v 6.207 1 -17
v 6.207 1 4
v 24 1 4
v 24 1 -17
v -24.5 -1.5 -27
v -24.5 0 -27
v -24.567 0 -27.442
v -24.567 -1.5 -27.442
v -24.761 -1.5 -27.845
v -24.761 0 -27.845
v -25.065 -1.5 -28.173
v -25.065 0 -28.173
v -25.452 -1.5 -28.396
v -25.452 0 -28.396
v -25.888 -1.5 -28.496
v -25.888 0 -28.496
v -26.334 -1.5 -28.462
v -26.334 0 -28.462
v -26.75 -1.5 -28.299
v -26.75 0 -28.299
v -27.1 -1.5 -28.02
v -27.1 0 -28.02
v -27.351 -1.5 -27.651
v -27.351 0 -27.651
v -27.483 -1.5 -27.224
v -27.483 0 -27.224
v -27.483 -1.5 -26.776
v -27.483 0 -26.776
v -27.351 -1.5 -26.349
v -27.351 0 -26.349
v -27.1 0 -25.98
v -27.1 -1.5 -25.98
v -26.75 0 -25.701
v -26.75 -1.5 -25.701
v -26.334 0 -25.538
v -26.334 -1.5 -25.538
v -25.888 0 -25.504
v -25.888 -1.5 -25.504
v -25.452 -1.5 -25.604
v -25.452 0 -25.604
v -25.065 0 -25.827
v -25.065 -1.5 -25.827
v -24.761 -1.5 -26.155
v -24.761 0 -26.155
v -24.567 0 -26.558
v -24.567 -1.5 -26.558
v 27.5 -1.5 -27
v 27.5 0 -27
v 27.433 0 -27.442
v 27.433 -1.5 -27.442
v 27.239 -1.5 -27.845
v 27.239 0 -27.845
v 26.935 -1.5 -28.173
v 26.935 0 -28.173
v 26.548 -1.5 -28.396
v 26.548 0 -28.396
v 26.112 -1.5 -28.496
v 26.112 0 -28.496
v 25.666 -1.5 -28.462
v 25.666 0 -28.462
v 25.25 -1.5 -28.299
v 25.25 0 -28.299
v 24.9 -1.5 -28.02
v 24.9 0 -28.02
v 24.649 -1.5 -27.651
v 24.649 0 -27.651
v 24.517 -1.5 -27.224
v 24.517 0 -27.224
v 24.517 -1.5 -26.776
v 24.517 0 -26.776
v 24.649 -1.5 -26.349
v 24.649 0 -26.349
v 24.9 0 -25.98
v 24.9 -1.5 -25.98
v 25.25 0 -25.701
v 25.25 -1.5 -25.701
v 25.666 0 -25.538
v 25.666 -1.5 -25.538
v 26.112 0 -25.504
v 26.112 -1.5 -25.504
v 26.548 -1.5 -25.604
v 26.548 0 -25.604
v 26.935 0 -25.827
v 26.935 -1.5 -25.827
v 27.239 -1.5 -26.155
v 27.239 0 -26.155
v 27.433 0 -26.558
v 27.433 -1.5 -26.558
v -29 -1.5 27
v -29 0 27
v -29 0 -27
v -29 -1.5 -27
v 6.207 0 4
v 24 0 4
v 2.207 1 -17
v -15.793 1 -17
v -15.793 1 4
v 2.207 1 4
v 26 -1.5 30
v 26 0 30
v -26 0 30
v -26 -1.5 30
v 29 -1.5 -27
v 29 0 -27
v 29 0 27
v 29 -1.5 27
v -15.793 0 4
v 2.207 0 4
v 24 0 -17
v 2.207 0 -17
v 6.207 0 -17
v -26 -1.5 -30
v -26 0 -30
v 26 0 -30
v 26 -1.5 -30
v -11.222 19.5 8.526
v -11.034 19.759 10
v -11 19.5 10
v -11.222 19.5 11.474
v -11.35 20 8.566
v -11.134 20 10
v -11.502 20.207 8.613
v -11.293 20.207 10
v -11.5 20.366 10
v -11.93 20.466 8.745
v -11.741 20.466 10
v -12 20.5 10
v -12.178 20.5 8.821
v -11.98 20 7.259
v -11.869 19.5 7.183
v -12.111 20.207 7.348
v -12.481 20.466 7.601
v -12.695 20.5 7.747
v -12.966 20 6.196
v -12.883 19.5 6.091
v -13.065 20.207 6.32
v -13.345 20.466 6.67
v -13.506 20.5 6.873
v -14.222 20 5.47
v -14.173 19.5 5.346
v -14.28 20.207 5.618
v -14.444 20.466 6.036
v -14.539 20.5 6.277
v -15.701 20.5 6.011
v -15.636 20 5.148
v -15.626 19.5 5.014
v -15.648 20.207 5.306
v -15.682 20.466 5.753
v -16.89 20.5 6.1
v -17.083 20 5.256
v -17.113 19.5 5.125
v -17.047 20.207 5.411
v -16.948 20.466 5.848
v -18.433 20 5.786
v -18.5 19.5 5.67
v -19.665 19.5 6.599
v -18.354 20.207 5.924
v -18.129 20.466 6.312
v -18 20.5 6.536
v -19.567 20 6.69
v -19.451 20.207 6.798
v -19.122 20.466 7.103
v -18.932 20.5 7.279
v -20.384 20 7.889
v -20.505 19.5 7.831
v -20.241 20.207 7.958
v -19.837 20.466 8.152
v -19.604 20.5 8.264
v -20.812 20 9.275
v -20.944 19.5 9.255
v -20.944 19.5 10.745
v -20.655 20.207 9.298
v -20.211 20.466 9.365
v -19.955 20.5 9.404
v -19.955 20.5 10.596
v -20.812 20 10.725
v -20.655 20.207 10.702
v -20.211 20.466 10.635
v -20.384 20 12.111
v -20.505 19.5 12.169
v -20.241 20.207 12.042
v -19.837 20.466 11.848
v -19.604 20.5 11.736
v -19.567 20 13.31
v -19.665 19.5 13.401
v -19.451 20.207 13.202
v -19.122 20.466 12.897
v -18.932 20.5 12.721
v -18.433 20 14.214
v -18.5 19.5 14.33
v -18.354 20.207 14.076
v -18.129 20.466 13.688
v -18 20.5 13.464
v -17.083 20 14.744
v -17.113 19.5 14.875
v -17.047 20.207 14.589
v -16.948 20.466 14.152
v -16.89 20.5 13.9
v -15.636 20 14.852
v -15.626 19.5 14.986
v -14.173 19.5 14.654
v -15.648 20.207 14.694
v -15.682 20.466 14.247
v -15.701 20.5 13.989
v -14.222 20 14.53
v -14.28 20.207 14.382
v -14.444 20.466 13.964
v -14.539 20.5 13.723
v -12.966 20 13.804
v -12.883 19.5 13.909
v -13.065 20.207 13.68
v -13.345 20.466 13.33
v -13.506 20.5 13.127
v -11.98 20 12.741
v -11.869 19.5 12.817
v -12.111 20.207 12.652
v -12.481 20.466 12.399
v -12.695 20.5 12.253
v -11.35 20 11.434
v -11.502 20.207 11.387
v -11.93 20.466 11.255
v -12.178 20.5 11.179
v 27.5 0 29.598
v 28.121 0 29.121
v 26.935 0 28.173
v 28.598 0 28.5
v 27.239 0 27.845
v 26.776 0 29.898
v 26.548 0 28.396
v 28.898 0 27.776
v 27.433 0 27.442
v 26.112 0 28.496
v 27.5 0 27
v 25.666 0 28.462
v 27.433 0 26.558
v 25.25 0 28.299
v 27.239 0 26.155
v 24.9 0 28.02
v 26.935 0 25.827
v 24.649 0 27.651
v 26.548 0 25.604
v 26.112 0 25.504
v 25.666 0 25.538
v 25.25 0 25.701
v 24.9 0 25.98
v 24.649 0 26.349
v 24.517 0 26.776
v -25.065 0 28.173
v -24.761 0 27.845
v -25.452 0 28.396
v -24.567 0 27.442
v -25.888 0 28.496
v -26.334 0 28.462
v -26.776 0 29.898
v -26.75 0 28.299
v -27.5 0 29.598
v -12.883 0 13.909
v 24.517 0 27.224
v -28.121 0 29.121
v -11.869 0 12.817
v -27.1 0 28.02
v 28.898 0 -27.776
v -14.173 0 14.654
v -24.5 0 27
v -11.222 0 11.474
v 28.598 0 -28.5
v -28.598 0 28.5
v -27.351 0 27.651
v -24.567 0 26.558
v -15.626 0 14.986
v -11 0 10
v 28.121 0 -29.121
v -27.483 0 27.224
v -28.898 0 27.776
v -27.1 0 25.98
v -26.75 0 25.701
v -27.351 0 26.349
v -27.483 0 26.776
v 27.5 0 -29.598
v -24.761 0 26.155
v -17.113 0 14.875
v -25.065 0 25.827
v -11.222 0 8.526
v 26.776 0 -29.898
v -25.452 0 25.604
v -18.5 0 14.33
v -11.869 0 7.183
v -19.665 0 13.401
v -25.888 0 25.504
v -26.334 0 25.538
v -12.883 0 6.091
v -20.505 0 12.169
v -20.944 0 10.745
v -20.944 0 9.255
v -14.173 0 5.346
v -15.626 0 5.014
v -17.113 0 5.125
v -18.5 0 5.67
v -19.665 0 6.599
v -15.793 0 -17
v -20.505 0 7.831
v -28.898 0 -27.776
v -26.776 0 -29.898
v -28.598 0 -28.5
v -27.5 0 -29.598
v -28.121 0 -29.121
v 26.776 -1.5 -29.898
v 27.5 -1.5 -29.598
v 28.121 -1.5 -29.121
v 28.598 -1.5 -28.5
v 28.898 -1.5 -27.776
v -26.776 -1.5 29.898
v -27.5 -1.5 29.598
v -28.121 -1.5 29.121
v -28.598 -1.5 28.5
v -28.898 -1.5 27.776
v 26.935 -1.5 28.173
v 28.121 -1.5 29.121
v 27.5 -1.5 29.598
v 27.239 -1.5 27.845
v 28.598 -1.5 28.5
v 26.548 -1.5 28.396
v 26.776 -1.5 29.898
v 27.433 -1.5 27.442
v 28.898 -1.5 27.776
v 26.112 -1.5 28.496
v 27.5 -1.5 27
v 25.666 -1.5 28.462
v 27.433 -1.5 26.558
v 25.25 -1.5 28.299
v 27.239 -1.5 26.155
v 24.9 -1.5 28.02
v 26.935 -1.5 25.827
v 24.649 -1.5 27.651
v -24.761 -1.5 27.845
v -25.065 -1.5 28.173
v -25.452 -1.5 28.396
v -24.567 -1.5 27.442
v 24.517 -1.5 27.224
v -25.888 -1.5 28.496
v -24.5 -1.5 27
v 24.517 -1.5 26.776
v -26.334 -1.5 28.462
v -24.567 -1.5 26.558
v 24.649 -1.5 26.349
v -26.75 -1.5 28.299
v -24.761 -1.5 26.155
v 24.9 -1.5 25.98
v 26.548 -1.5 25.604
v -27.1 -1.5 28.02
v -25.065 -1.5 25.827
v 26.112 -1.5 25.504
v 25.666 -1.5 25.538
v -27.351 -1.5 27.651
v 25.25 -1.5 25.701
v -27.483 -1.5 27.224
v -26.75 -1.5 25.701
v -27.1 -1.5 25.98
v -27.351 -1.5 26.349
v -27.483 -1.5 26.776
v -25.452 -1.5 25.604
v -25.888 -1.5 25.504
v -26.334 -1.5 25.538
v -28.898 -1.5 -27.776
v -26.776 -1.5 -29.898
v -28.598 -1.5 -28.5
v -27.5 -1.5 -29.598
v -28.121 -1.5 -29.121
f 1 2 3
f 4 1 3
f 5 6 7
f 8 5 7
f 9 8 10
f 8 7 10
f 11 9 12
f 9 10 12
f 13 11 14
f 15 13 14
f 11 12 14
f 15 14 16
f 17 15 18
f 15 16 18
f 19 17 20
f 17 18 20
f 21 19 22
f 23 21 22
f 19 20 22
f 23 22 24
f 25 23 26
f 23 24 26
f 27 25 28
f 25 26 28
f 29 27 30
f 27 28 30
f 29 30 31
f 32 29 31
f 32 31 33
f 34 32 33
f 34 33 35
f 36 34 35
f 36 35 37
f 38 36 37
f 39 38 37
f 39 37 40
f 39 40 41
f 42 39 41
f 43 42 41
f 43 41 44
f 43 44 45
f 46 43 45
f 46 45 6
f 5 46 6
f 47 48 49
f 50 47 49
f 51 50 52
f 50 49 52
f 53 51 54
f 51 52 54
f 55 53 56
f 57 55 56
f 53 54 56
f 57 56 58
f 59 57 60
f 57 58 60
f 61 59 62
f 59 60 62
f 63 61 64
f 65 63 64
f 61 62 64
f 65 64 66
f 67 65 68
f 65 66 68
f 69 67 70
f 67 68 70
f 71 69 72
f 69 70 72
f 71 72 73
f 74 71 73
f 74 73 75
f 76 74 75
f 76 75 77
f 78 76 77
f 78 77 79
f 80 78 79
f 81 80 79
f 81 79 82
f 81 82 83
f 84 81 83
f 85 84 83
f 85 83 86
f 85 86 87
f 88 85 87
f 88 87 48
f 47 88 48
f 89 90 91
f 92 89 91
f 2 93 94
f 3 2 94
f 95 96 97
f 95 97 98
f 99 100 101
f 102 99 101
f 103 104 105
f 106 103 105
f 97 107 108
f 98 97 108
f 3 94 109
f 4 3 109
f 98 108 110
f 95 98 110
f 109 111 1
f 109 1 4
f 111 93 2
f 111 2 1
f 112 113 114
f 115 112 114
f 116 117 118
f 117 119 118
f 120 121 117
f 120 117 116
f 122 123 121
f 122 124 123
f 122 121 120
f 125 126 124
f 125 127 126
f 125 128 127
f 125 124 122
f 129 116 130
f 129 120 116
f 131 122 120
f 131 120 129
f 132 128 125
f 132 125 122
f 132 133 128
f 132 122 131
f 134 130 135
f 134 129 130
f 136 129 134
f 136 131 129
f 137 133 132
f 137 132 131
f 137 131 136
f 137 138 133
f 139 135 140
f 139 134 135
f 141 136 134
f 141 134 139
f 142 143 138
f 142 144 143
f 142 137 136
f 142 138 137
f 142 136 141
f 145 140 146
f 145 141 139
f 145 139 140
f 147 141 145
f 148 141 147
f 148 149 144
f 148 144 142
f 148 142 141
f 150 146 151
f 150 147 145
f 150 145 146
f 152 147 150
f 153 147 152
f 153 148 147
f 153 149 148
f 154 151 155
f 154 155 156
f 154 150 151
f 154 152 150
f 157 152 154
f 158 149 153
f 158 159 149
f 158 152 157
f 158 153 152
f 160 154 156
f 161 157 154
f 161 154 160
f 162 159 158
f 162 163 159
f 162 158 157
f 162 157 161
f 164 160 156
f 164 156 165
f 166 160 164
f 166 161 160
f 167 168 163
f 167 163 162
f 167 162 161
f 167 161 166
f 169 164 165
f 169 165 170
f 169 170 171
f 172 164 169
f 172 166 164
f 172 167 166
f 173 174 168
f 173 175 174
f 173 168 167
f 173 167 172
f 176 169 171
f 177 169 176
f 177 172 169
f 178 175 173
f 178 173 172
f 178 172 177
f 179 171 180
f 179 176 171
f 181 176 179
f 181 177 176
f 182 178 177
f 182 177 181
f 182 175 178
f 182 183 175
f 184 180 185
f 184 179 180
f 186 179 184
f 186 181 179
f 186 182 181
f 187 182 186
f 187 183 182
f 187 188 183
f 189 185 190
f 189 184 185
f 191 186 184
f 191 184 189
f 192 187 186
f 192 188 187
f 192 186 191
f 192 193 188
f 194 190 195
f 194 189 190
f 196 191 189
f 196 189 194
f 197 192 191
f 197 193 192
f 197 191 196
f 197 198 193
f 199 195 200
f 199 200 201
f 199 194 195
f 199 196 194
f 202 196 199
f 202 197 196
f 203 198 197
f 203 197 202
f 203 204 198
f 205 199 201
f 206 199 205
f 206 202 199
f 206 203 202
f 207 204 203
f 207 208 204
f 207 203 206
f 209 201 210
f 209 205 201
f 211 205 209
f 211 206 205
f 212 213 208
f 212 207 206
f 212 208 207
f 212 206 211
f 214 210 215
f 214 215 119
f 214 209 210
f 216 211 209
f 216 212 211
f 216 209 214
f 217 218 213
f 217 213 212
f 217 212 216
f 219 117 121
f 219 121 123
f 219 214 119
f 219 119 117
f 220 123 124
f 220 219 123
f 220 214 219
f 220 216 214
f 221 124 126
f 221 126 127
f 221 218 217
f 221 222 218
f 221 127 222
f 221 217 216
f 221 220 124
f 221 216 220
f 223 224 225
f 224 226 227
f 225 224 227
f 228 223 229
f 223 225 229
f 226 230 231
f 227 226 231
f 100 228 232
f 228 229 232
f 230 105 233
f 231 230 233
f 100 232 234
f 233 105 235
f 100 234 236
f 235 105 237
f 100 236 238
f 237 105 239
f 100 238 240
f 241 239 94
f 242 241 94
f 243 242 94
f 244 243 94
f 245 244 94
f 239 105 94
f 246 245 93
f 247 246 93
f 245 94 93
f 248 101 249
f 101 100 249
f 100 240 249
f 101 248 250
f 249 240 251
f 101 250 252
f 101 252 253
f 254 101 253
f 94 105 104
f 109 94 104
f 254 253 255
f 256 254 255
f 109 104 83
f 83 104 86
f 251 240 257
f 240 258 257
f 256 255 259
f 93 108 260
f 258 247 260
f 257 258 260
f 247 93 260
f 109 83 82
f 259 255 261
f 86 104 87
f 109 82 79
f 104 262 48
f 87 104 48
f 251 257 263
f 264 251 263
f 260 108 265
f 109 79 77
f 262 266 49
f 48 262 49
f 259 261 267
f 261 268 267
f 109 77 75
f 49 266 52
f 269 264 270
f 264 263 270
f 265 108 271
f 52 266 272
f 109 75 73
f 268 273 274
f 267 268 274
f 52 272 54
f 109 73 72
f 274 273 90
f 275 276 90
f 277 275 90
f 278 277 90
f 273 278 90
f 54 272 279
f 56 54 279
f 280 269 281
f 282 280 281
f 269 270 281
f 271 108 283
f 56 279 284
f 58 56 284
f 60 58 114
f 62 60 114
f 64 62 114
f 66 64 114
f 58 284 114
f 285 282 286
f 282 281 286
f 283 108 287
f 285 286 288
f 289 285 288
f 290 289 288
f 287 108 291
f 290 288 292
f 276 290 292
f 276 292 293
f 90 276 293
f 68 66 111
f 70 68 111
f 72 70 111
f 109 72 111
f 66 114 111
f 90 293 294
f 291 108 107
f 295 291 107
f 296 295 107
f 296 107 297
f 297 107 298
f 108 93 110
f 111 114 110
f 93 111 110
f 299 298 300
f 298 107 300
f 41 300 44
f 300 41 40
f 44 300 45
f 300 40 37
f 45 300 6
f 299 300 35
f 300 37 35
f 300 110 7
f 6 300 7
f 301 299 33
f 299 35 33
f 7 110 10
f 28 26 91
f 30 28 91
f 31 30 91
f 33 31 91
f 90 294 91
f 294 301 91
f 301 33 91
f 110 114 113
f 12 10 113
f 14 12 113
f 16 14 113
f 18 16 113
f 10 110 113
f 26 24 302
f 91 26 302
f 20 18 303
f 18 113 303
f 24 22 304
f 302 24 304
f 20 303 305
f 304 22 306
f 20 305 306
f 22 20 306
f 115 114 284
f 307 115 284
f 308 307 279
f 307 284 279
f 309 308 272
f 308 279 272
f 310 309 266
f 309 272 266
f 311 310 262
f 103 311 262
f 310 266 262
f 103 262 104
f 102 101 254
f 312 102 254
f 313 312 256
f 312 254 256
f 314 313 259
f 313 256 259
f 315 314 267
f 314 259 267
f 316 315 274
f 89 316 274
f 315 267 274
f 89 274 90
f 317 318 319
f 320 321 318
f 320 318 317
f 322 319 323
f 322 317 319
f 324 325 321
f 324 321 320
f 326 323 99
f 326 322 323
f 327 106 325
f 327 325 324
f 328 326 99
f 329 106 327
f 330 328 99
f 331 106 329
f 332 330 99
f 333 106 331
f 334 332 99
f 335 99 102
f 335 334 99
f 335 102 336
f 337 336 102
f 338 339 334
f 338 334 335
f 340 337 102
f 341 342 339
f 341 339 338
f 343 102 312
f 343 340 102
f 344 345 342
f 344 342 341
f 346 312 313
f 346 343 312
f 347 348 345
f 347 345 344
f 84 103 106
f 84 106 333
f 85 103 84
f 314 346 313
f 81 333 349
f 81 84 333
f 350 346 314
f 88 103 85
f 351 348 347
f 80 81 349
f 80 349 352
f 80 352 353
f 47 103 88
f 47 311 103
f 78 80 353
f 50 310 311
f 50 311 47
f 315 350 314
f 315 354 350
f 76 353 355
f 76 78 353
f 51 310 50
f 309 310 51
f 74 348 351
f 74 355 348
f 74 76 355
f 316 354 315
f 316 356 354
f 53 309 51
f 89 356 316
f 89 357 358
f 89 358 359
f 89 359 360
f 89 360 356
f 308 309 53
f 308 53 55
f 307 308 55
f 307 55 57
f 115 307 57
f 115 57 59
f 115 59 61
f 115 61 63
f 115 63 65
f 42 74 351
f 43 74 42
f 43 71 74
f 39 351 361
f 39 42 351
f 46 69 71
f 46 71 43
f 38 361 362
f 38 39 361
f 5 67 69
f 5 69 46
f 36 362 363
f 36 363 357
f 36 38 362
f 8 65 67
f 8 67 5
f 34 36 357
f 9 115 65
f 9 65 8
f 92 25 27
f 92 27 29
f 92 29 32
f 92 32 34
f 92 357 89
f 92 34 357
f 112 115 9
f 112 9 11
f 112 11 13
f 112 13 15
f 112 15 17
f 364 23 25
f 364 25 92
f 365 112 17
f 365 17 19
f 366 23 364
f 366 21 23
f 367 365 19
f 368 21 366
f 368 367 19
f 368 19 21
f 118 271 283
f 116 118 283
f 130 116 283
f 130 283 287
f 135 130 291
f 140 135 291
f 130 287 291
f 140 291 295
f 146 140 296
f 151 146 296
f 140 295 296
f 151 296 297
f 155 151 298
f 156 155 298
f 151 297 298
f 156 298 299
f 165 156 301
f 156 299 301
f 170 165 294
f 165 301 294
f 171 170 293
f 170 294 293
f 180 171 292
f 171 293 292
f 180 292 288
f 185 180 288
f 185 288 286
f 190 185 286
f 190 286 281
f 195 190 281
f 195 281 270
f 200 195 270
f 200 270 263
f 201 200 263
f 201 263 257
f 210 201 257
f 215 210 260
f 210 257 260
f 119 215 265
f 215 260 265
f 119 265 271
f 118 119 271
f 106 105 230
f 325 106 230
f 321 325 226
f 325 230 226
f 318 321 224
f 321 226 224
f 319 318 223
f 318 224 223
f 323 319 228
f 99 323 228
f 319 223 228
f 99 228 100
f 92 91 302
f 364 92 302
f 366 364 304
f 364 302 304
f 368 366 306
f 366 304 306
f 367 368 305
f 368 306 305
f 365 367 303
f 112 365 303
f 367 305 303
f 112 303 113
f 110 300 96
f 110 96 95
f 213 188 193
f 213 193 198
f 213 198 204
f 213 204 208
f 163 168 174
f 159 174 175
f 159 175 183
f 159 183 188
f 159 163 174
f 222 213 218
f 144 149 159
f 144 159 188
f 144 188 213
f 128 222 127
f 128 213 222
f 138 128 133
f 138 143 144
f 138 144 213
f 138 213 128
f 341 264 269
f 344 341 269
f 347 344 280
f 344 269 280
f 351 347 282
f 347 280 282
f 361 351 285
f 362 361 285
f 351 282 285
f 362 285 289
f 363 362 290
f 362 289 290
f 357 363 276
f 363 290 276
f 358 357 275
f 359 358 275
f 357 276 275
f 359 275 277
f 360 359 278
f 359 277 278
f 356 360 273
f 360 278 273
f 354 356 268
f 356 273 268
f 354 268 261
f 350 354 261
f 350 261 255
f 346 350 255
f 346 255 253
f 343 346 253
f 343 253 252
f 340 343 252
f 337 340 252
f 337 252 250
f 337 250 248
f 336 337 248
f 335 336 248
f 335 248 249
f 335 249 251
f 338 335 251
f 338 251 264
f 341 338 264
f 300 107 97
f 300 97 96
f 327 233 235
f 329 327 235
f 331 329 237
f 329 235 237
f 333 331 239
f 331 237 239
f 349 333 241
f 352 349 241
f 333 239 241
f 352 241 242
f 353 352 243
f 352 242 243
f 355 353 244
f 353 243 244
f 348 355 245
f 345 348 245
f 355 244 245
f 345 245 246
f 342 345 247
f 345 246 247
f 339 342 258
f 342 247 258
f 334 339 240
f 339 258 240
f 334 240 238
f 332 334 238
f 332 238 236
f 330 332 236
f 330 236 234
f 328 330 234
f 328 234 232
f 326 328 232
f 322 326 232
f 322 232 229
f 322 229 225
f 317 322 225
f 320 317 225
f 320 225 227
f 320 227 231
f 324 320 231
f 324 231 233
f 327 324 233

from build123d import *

# Parameters (mm, degrees)
BOSS_EXTRUDE2_DEPTH = 1.5
SKETCH3_W           = 17.792742237
SKETCH3_H           = 21
SKETCH3_W_2         = 18
BOSS_EXTRUDE4_DEPTH = 1
SKETCH5_R           = 5
BOSS_EXTRUDE6_DEPTH = 20.5
FILLET4_R           = 1
CUT_EXTRUDE1_REACH  = 3.5
SKETCH6_R           = 1.5


with BuildPart() as part:
    # Sketch1 → Boss-Extrude2 (new body)
    with BuildSketch(Plane(origin=(0, 0, 0), x_dir=(1, 0, 0), z_dir=(0, 1, 0))):
        with BuildLine():
            Line((-26, 30), (26, 30))
            ThreePointArc((26, 30), (28.121320344, 29.121320344), (29, 27))
            Line((29, 27), (29, -27))
            ThreePointArc((29, -27), (28.121320344, -29.121320344), (26, -30))
            Line((26, -30), (-26, -30))
            ThreePointArc((-26, -30), (-28.121320344, -29.121320344), (-29, -27))
            Line((-29, -27), (-29, 27))
            ThreePointArc((-29, 27), (-28.121320344, 29.121320344), (-26, 30))
        make_face()
    extrude(amount=-BOSS_EXTRUDE2_DEPTH)

    # Sketch3 → Boss-Extrude4 (add)
    with BuildSketch(Plane(origin=(0, 0, 0), x_dir=(1, 0, 0), z_dir=(0, 1, 0))):
        with Locations((15.103628882, 6.5)):
            Rectangle(SKETCH3_W, SKETCH3_H)
        with Locations((-6.792742237, 6.5)):
            Rectangle(SKETCH3_W_2, SKETCH3_H)
    extrude(amount=BOSS_EXTRUDE4_DEPTH)

    # Sketch5 → Boss-Extrude6 (add)
    with BuildSketch(Plane(origin=(0, 0, 0), x_dir=(1, 0, 0), z_dir=(0, 1, 0))):
        with Locations((-16, -10)):
            Circle(SKETCH5_R)
    extrude(amount=BOSS_EXTRUDE6_DEPTH)

    # Fillet4
    fillet4_edges = [part.edges().sort_by_distance(p)[0] for p in [
        (-21, 20.5, 10),
    ]]
    fillet(fillet4_edges, radius=FILLET4_R)

    # Sketch6 → Cut-Extrude1 (cut, up to next)
    with BuildSketch(Plane(origin=(0, 0, 0), x_dir=(1, 0, 0), z_dir=(0, 1, 0)), mode=Mode.PRIVATE) as cut_extrude1_sk1:
        with Locations((-26, 27)):
            Circle(SKETCH6_R)
    cut_extrude1_tool1 = extrude(cut_extrude1_sk1.sketch, amount=-CUT_EXTRUDE1_REACH, mode=Mode.PRIVATE) & part.part
    add(cut_extrude1_tool1.solids().sort_by_distance((-26, 0, -27))[0], mode=Mode.SUBTRACT)
    # Sketch6 → Cut-Extrude1 (cut, up to next)
    with BuildSketch(Plane(origin=(0, 0, 0), x_dir=(1, 0, 0), z_dir=(0, 1, 0)), mode=Mode.PRIVATE) as cut_extrude1_sk2:
        with Locations((26, 27)):
            Circle(SKETCH6_R)
    cut_extrude1_tool2 = extrude(cut_extrude1_sk2.sketch, amount=-CUT_EXTRUDE1_REACH, mode=Mode.PRIVATE) & part.part
    add(cut_extrude1_tool2.solids().sort_by_distance((26, 0, -27))[0], mode=Mode.SUBTRACT)
    # Sketch6 → Cut-Extrude1 (cut, up to next)
    with BuildSketch(Plane(origin=(0, 0, 0), x_dir=(1, 0, 0), z_dir=(0, 1, 0)), mode=Mode.PRIVATE) as cut_extrude1_sk3:
        with Locations((-26, -27)):
            Circle(SKETCH6_R)
    cut_extrude1_tool3 = extrude(cut_extrude1_sk3.sketch, amount=-CUT_EXTRUDE1_REACH, mode=Mode.PRIVATE) & part.part
    add(cut_extrude1_tool3.solids().sort_by_distance((-26, 0, 27))[0], mode=Mode.SUBTRACT)
    # Sketch6 → Cut-Extrude1 (cut, up to next)
    with BuildSketch(Plane(origin=(0, 0, 0), x_dir=(1, 0, 0), z_dir=(0, 1, 0)), mode=Mode.PRIVATE) as cut_extrude1_sk4:
        with Locations((26, -27)):
            Circle(SKETCH6_R)
    cut_extrude1_tool4 = extrude(cut_extrude1_sk4.sketch, amount=-CUT_EXTRUDE1_REACH, mode=Mode.PRIVATE) & part.part
    add(cut_extrude1_tool4.solids().sort_by_distance((26, 0, 27))[0], mode=Mode.SUBTRACT)


solid = part.part
